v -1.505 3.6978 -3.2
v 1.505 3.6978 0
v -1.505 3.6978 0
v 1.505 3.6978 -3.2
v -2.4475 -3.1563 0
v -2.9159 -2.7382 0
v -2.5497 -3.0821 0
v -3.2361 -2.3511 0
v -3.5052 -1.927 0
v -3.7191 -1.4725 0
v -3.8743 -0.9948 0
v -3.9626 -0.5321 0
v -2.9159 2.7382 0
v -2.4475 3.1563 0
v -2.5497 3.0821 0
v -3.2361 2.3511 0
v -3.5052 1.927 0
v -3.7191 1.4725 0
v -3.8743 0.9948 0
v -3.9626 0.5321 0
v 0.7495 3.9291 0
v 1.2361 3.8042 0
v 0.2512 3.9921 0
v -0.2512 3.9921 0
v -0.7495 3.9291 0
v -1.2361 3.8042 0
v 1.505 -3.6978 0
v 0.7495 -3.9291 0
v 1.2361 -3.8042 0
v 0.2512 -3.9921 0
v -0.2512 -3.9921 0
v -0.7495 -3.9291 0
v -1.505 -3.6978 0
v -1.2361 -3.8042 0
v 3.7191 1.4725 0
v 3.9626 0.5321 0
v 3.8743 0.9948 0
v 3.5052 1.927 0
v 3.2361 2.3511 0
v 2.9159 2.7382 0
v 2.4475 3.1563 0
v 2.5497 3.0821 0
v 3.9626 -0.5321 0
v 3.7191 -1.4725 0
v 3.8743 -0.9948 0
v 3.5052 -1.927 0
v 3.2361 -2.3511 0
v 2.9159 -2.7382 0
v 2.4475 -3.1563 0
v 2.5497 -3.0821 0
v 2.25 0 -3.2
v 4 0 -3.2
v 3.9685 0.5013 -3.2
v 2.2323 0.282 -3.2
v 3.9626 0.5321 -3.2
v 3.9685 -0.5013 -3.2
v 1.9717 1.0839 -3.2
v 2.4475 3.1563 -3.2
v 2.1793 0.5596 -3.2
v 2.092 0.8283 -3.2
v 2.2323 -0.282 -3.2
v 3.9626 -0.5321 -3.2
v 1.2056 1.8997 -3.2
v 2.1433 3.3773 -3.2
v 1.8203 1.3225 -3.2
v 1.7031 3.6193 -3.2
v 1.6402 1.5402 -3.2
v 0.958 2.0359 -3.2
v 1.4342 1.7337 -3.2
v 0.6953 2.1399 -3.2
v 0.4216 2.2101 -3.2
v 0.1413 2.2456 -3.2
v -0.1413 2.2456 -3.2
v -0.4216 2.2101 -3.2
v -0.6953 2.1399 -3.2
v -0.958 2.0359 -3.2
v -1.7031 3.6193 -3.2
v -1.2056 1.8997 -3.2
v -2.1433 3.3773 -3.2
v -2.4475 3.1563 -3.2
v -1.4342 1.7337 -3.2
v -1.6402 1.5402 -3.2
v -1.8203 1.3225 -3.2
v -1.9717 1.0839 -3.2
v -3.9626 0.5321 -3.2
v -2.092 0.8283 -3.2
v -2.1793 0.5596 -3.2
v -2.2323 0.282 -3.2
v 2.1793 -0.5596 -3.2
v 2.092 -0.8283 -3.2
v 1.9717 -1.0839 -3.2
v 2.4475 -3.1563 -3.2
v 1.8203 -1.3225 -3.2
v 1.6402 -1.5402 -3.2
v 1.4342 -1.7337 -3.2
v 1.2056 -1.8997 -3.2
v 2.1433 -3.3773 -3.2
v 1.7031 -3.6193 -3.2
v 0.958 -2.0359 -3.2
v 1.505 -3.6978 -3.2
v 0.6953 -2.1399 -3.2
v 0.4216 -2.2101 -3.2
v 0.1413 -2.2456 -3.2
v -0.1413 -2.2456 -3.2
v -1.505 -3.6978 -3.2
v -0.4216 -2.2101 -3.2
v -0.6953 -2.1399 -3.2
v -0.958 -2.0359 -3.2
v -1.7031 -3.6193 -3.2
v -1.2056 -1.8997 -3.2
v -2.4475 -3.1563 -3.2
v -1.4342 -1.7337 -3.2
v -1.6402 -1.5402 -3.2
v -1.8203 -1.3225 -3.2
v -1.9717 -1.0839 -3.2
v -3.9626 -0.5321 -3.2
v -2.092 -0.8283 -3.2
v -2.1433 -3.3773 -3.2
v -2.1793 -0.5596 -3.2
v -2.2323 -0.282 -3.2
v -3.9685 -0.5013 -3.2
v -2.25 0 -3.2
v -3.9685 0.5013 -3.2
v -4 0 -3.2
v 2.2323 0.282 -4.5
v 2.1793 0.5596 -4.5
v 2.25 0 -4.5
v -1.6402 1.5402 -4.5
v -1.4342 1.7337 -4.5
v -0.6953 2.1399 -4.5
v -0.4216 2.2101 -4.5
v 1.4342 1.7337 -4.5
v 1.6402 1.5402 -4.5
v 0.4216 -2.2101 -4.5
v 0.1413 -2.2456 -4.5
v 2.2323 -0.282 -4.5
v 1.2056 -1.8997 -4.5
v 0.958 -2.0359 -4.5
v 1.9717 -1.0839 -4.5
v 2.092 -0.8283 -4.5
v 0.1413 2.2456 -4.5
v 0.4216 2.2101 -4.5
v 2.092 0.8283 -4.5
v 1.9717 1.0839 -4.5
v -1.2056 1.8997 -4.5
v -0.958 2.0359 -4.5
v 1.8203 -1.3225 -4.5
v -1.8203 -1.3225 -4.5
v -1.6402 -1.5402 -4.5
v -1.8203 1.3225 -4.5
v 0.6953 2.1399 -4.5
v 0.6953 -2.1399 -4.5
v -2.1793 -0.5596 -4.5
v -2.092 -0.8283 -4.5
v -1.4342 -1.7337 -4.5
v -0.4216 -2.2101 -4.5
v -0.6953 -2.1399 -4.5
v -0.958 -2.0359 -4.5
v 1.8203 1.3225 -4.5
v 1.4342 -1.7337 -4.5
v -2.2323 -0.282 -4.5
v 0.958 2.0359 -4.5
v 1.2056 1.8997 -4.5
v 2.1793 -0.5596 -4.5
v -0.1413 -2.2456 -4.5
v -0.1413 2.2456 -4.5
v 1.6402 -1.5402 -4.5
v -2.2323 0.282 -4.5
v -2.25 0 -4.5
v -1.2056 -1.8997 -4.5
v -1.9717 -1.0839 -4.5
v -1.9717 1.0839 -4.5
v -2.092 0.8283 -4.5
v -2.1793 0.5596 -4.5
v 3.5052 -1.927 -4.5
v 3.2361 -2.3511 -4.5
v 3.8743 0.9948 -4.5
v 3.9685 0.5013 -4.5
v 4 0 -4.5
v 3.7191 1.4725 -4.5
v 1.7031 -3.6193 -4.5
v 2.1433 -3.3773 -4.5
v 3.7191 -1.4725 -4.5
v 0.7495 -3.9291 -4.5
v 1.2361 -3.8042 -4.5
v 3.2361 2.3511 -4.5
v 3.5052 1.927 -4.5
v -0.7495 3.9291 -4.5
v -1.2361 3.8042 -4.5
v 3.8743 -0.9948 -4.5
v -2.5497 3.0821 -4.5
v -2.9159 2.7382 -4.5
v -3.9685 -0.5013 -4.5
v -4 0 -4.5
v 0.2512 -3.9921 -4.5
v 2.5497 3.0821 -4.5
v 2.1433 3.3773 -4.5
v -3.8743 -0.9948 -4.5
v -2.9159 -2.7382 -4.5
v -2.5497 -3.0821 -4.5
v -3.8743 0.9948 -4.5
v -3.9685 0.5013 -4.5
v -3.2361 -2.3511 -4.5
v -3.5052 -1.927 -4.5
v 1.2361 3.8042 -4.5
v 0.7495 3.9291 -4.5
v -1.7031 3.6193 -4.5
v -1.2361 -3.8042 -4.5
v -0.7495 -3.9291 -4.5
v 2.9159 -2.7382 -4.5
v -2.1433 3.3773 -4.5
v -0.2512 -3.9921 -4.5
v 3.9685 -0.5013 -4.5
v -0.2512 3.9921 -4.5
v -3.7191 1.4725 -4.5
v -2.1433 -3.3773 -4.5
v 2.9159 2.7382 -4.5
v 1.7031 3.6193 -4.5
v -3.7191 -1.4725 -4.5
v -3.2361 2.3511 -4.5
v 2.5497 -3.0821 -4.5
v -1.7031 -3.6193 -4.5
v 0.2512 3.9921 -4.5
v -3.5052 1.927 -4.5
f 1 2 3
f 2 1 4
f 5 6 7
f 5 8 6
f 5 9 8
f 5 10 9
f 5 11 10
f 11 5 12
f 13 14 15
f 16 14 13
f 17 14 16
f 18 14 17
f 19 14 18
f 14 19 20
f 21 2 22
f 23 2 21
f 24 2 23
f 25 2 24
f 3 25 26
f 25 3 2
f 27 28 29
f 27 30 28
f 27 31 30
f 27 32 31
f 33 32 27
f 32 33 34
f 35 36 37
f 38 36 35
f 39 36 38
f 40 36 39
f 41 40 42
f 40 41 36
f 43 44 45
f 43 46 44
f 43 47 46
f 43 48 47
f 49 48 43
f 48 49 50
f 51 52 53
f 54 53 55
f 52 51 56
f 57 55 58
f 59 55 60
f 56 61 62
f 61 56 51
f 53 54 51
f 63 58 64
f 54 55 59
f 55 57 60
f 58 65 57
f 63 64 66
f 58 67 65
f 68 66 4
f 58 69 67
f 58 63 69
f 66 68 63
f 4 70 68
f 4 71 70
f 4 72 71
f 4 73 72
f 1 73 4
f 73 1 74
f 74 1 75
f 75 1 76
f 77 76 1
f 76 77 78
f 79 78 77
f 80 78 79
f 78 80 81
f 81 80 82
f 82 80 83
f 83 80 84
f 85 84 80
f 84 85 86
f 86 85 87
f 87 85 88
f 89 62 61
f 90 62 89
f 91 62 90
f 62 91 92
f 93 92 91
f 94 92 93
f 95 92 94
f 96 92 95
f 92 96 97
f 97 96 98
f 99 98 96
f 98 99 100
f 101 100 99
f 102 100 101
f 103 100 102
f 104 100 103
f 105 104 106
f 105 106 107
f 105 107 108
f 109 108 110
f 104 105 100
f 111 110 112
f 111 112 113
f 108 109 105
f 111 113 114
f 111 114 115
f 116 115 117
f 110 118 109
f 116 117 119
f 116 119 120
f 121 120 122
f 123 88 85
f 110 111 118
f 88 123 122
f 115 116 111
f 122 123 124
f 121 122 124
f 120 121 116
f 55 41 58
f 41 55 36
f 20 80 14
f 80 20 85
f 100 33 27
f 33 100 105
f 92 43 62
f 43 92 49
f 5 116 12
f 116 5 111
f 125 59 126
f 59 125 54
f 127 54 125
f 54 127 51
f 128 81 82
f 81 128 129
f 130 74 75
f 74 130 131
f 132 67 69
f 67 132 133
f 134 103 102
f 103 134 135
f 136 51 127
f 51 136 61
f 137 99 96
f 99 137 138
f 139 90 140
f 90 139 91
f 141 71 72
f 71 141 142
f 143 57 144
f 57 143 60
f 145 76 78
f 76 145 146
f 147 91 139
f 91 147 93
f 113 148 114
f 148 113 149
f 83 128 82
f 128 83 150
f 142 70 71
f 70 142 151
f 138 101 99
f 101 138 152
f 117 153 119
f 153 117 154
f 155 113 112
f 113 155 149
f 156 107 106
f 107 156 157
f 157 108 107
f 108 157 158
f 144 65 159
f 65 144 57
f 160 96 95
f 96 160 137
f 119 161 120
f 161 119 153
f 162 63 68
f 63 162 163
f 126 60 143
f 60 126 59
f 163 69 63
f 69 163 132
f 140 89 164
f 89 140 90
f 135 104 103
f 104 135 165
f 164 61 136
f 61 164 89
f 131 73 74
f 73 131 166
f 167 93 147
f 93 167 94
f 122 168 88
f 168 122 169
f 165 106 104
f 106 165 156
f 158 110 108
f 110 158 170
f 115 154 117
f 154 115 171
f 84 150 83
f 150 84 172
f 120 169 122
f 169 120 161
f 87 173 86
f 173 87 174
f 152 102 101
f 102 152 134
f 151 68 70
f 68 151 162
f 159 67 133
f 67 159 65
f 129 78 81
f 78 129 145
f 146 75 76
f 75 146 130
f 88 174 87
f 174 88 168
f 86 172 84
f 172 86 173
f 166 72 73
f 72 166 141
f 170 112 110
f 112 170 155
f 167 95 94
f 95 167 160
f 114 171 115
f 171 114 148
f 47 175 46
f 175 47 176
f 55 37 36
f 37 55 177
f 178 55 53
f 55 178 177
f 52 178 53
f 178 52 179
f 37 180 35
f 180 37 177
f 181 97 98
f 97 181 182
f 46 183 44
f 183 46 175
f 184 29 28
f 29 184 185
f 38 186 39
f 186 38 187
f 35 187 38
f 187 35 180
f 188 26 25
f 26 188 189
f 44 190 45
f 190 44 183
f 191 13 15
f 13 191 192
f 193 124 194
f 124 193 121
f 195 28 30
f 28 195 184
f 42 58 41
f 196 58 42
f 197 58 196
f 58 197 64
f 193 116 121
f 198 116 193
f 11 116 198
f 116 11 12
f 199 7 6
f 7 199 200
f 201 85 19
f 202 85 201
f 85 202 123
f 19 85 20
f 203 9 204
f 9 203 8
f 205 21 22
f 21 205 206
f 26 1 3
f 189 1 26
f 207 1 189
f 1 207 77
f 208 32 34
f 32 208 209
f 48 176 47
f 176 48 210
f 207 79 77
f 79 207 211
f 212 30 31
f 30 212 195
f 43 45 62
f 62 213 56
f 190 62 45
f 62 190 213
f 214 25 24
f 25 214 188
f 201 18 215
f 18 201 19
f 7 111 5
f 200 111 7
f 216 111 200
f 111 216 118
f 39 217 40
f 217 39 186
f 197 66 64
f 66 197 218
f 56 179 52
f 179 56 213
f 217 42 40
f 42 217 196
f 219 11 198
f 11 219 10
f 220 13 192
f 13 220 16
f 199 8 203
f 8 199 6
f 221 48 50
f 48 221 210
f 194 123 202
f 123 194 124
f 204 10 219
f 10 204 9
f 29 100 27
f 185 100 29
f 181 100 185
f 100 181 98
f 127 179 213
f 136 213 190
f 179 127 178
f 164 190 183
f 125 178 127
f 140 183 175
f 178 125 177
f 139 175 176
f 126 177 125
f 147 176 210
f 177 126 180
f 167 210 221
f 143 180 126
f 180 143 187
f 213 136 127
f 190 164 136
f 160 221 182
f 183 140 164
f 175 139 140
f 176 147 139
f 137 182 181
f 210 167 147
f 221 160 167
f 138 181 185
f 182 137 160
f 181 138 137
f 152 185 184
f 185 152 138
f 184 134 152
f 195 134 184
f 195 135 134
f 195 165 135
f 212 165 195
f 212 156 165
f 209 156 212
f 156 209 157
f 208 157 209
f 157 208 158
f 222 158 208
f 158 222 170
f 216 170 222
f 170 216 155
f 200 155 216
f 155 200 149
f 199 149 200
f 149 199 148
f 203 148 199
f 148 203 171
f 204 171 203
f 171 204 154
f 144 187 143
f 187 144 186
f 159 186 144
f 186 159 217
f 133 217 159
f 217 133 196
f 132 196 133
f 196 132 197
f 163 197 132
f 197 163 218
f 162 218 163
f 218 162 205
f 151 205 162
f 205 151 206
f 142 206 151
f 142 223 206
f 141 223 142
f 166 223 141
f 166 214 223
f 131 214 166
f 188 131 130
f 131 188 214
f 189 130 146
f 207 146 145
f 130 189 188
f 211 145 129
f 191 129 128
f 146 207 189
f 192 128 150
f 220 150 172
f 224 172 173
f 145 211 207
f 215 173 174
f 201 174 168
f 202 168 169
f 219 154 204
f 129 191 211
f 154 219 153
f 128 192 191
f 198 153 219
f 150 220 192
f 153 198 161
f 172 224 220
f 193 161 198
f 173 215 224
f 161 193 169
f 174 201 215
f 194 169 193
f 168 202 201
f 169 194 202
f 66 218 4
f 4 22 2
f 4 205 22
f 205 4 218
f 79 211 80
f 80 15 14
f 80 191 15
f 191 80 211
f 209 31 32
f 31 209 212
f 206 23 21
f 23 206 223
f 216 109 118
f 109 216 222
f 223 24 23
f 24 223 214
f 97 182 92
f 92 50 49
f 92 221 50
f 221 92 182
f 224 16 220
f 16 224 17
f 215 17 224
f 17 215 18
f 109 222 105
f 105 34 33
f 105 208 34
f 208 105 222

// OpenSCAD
$fn = 50;

difference() {
	union() {
		translate(v = [0, 0, -4.5]) {
			cylinder(h = 7.5, r = 4.0);
		}
	}
	union() {
		translate(v = [0, 0, 0]) {
			rotate(a = [0, 0, 0]) {
				difference() {
					union() {
						translate(v = [0, 0, -3.2]) {
							linear_extrude(height = 3.2) {
								polygon(points = [[4.2698, 0.0], [2.1349000000000005, 3.697755269078796], [-2.134899999999999, 3.6977552690787965], [-4.2698, 5.228996902999369e-16], [-2.134900000000002, -3.6977552690787956], [2.1348999999999974, -3.697755269078798]]);
							}
						}
					}
					union();
				}
			}
		}
		#cylinder(h = 3, r = 5.0);
		#translate(v = [0, 0, -100.0]) {
			cylinder(h = 200, r = 2.25);
		}
	}
}
